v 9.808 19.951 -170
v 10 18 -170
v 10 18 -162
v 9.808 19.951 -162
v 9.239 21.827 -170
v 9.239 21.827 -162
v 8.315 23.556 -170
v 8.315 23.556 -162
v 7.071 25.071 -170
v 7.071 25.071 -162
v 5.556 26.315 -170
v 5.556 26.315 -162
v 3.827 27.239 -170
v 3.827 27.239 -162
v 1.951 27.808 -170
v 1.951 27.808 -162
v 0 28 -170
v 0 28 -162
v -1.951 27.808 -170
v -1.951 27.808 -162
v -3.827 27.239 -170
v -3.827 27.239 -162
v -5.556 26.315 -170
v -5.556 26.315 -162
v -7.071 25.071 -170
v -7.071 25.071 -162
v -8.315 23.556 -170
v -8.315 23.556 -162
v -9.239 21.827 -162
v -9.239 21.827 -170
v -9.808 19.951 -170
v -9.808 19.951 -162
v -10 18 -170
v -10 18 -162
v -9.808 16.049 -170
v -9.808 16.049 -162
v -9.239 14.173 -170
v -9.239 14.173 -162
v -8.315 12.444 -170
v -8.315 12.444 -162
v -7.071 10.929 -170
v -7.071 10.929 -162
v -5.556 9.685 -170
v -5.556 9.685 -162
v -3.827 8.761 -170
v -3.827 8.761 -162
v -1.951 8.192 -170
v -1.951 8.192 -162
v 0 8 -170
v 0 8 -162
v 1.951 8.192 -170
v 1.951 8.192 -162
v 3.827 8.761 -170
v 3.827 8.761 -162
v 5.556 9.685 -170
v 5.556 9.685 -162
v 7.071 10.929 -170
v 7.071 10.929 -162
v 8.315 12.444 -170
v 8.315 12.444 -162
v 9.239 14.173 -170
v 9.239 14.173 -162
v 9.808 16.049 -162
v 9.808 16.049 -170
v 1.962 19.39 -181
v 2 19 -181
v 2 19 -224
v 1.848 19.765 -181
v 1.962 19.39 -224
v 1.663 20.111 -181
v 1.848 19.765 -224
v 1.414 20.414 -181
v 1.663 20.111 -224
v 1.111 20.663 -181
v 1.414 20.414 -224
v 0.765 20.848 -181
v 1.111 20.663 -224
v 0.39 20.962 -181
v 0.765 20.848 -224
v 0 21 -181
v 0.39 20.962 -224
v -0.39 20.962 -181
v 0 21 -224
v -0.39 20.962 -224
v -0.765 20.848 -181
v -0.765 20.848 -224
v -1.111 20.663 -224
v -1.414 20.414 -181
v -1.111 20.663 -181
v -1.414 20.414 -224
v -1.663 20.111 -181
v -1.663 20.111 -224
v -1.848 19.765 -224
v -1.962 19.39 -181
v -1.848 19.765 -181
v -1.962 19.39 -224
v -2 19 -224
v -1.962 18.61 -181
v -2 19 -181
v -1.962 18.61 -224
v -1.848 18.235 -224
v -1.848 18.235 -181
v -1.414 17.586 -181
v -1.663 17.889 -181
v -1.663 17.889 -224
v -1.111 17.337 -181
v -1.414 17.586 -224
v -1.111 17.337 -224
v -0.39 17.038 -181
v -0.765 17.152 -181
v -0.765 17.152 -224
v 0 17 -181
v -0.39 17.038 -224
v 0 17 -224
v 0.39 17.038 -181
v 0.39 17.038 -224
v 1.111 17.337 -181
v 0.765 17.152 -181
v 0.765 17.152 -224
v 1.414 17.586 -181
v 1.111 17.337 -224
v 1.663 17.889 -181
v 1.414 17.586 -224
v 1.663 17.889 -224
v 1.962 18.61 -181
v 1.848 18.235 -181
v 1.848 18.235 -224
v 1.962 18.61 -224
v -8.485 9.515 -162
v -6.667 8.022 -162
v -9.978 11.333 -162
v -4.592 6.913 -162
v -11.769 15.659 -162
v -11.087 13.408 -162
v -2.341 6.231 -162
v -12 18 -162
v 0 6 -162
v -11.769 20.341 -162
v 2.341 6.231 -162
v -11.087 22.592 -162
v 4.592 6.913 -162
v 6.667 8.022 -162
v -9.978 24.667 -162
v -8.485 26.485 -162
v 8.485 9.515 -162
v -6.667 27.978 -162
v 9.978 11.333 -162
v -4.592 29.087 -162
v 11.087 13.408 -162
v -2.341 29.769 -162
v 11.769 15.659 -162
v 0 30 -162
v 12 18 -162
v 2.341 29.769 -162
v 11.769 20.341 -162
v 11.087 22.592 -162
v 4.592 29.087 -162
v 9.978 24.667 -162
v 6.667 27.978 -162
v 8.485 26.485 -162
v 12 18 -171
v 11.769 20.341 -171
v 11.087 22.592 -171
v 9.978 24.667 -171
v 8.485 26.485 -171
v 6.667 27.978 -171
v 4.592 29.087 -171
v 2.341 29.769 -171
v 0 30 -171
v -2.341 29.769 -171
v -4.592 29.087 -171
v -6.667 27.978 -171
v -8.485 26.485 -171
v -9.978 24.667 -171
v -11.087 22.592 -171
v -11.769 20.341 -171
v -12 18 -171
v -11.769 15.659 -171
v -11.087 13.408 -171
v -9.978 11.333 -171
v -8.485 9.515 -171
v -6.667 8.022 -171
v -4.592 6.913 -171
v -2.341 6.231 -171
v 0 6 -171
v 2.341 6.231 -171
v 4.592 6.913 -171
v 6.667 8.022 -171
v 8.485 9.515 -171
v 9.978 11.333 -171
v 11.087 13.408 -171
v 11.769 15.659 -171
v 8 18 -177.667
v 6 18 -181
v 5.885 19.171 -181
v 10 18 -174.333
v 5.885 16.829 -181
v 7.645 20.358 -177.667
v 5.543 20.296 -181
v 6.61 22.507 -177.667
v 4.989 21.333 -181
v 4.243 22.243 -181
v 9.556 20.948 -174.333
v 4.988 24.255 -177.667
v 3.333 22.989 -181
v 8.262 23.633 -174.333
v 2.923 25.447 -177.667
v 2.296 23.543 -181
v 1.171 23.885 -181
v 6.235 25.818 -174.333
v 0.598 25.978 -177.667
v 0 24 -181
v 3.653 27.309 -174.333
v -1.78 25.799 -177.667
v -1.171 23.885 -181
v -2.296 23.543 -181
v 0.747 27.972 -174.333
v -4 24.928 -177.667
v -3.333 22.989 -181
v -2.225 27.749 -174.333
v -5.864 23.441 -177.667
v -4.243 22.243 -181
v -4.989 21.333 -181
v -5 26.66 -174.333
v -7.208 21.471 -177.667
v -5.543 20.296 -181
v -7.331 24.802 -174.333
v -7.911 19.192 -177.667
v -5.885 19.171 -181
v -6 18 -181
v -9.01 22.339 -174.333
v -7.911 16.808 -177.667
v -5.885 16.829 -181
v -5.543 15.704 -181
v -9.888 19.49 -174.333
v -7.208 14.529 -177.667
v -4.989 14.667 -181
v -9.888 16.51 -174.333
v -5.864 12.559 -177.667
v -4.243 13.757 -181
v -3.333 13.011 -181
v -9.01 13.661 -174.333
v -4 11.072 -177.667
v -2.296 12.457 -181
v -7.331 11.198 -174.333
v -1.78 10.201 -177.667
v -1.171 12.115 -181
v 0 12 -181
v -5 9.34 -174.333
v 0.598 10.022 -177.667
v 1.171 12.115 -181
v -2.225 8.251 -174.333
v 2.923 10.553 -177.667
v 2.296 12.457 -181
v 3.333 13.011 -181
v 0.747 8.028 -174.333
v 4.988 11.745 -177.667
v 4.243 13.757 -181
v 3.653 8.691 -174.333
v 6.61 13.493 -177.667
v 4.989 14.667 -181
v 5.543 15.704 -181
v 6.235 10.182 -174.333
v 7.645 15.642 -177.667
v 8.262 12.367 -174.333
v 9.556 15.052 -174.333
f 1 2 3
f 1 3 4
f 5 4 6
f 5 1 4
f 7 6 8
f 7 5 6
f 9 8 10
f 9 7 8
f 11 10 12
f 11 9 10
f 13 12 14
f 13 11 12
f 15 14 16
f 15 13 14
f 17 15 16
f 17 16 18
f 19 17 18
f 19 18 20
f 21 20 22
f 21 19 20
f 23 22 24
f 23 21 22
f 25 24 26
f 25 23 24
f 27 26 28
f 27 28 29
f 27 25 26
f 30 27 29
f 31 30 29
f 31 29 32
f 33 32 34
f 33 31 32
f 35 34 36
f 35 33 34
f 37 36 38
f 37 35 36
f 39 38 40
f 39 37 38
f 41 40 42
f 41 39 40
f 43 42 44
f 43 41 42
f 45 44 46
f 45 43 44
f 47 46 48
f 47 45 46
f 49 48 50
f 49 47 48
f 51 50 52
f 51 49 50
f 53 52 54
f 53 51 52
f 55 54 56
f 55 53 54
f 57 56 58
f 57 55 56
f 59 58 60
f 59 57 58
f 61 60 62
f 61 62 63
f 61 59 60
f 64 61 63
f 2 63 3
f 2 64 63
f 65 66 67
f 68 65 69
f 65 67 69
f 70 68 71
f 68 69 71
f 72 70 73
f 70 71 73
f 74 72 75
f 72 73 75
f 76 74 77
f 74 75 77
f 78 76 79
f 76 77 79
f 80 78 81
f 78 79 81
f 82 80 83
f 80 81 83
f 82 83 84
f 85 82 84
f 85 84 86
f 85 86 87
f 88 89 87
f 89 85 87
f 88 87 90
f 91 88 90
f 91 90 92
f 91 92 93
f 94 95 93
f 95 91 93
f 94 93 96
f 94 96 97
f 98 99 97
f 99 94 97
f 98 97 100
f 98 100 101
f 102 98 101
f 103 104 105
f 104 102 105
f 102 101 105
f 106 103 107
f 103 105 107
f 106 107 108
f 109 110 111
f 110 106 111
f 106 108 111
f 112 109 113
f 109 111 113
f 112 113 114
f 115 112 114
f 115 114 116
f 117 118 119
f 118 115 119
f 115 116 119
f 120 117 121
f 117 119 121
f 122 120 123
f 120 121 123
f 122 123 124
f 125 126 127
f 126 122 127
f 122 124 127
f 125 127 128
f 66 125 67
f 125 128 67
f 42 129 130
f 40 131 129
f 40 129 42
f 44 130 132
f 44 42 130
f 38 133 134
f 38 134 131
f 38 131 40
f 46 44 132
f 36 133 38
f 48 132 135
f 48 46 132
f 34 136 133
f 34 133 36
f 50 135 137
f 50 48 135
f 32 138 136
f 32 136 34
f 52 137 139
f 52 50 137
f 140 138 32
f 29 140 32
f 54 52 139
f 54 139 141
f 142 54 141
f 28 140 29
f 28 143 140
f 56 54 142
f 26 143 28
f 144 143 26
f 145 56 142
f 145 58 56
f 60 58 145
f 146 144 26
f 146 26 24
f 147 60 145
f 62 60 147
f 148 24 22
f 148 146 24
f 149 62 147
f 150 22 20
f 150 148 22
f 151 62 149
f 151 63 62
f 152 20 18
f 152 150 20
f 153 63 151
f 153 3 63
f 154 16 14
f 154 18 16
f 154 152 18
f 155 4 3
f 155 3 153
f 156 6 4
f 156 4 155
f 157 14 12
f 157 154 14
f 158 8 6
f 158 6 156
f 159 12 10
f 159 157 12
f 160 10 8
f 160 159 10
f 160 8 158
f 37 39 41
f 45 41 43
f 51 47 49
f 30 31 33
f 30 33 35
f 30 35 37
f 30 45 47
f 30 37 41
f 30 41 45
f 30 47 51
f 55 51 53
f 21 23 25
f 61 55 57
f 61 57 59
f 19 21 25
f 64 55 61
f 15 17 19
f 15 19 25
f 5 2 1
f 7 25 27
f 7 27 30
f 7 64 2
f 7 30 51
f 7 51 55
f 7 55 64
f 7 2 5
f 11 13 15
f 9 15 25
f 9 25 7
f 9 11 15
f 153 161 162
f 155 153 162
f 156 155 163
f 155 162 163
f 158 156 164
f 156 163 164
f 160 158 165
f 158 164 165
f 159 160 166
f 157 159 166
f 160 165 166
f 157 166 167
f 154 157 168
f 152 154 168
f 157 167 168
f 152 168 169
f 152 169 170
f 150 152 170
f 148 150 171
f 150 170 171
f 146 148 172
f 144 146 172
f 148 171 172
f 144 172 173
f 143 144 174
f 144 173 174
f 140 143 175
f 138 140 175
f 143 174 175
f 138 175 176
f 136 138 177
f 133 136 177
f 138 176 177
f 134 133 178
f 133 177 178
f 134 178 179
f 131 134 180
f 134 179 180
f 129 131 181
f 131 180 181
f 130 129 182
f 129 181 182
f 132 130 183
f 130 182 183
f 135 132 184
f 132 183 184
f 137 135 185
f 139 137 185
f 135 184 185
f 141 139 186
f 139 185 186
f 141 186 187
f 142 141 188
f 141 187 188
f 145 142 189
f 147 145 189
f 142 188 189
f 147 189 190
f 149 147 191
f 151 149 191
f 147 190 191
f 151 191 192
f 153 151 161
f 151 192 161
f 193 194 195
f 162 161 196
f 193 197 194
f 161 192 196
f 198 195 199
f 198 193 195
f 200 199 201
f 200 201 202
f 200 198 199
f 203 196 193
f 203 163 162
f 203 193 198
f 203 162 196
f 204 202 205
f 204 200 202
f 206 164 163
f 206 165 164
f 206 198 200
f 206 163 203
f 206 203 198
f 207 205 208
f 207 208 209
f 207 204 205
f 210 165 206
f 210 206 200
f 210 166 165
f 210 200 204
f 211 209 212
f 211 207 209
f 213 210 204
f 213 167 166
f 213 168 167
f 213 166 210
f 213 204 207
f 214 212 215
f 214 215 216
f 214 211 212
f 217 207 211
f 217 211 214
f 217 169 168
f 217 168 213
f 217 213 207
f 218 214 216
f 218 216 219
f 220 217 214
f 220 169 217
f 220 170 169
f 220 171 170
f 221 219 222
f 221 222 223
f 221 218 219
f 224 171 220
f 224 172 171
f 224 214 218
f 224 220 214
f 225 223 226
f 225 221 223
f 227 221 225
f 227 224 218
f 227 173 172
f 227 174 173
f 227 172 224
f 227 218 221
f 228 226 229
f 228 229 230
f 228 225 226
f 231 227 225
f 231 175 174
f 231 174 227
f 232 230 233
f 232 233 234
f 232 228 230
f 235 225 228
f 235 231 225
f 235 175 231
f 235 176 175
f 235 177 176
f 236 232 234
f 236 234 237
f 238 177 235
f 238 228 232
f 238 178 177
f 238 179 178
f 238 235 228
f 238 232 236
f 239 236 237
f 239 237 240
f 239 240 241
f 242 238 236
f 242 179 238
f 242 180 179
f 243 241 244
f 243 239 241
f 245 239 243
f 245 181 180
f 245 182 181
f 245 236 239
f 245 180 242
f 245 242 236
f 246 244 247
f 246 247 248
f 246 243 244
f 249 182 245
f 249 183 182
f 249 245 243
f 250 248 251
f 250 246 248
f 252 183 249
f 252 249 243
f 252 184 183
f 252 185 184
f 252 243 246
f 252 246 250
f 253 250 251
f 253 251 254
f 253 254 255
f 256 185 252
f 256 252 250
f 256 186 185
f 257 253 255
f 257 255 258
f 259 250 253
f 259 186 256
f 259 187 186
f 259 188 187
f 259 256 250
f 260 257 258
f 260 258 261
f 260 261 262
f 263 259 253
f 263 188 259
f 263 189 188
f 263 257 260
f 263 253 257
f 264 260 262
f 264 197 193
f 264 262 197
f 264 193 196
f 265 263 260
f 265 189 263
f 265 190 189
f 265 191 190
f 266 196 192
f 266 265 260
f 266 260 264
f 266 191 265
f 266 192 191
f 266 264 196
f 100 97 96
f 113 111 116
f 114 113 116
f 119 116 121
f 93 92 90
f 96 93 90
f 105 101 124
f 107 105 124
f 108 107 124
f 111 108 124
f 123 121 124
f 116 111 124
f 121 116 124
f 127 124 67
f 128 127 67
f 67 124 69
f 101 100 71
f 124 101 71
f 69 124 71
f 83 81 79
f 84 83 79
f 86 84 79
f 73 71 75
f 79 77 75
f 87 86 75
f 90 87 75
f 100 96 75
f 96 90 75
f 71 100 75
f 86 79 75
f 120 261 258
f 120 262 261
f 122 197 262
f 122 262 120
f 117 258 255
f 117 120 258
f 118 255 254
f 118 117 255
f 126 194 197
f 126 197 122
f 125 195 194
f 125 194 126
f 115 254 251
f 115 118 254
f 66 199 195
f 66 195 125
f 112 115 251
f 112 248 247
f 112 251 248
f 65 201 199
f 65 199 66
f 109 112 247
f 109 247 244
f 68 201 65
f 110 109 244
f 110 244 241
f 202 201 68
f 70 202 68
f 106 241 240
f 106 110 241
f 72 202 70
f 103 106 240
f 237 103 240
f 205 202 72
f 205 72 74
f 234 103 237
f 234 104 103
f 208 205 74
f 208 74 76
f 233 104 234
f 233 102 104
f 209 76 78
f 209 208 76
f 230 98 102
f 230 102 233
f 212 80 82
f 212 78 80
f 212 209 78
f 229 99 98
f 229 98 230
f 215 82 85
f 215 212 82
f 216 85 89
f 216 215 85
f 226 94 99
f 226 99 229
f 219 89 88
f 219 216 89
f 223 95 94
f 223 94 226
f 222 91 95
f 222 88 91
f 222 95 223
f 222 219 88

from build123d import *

# Parameters (mm, degrees)
CYLINDER084_R     = 2
CYLINDER084_DEPTH = 52
CYLINDER048_R     = 10
CYLINDER048_DEPTH = 8
CYLINDER049_R     = 12
CYLINDER049_DEPTH = 9


with BuildPart() as cylindre080:
    # Cylinder084 → Cylinder084 (new body)
    with BuildSketch(Plane(origin=(0, 19, -224), x_dir=(1, 0, 0), z_dir=(0, 0, 1))):
        Circle(CYLINDER084_R)
    extrude(amount=CYLINDER084_DEPTH)


with BuildPart() as c_ne:
    # Cone → Cone (revolve)
    with BuildSketch(Plane(origin=(0, 18, -181), x_dir=(1, 0, 0), z_dir=(0, -1, 0))):
        Polygon((0, 0), (6, 0), (12, 10), (0, 10), align=None)
    revolve(axis=Axis((0, 18, -181), (0, 0, 1)))


with BuildPart() as cylindre044:
    # Cylinder048 → Cylinder048 (new body)
    with BuildSketch(Plane(origin=(0, 18, -170), x_dir=(1, 0, 0), z_dir=(0, 0, 1))):
        Circle(CYLINDER048_R)
    extrude(amount=CYLINDER048_DEPTH)


with BuildPart() as fusion046:
    # Cylinder049 → Cylinder049 (new body)
    with BuildSketch(Plane(origin=(0, 18, -171), x_dir=(1, 0, 0), z_dir=(0, 0, 1))):
        Circle(CYLINDER049_R)
    extrude(amount=CYLINDER049_DEPTH)

    # Cut036: cut Cylindre044
    add(cylindre044.part, mode=Mode.SUBTRACT)

    # Fusion024: union Cône
    add(c_ne.part)

    # Fusion046: union Cylindre080
    add(cylindre080.part)


solid = fusion046.part
